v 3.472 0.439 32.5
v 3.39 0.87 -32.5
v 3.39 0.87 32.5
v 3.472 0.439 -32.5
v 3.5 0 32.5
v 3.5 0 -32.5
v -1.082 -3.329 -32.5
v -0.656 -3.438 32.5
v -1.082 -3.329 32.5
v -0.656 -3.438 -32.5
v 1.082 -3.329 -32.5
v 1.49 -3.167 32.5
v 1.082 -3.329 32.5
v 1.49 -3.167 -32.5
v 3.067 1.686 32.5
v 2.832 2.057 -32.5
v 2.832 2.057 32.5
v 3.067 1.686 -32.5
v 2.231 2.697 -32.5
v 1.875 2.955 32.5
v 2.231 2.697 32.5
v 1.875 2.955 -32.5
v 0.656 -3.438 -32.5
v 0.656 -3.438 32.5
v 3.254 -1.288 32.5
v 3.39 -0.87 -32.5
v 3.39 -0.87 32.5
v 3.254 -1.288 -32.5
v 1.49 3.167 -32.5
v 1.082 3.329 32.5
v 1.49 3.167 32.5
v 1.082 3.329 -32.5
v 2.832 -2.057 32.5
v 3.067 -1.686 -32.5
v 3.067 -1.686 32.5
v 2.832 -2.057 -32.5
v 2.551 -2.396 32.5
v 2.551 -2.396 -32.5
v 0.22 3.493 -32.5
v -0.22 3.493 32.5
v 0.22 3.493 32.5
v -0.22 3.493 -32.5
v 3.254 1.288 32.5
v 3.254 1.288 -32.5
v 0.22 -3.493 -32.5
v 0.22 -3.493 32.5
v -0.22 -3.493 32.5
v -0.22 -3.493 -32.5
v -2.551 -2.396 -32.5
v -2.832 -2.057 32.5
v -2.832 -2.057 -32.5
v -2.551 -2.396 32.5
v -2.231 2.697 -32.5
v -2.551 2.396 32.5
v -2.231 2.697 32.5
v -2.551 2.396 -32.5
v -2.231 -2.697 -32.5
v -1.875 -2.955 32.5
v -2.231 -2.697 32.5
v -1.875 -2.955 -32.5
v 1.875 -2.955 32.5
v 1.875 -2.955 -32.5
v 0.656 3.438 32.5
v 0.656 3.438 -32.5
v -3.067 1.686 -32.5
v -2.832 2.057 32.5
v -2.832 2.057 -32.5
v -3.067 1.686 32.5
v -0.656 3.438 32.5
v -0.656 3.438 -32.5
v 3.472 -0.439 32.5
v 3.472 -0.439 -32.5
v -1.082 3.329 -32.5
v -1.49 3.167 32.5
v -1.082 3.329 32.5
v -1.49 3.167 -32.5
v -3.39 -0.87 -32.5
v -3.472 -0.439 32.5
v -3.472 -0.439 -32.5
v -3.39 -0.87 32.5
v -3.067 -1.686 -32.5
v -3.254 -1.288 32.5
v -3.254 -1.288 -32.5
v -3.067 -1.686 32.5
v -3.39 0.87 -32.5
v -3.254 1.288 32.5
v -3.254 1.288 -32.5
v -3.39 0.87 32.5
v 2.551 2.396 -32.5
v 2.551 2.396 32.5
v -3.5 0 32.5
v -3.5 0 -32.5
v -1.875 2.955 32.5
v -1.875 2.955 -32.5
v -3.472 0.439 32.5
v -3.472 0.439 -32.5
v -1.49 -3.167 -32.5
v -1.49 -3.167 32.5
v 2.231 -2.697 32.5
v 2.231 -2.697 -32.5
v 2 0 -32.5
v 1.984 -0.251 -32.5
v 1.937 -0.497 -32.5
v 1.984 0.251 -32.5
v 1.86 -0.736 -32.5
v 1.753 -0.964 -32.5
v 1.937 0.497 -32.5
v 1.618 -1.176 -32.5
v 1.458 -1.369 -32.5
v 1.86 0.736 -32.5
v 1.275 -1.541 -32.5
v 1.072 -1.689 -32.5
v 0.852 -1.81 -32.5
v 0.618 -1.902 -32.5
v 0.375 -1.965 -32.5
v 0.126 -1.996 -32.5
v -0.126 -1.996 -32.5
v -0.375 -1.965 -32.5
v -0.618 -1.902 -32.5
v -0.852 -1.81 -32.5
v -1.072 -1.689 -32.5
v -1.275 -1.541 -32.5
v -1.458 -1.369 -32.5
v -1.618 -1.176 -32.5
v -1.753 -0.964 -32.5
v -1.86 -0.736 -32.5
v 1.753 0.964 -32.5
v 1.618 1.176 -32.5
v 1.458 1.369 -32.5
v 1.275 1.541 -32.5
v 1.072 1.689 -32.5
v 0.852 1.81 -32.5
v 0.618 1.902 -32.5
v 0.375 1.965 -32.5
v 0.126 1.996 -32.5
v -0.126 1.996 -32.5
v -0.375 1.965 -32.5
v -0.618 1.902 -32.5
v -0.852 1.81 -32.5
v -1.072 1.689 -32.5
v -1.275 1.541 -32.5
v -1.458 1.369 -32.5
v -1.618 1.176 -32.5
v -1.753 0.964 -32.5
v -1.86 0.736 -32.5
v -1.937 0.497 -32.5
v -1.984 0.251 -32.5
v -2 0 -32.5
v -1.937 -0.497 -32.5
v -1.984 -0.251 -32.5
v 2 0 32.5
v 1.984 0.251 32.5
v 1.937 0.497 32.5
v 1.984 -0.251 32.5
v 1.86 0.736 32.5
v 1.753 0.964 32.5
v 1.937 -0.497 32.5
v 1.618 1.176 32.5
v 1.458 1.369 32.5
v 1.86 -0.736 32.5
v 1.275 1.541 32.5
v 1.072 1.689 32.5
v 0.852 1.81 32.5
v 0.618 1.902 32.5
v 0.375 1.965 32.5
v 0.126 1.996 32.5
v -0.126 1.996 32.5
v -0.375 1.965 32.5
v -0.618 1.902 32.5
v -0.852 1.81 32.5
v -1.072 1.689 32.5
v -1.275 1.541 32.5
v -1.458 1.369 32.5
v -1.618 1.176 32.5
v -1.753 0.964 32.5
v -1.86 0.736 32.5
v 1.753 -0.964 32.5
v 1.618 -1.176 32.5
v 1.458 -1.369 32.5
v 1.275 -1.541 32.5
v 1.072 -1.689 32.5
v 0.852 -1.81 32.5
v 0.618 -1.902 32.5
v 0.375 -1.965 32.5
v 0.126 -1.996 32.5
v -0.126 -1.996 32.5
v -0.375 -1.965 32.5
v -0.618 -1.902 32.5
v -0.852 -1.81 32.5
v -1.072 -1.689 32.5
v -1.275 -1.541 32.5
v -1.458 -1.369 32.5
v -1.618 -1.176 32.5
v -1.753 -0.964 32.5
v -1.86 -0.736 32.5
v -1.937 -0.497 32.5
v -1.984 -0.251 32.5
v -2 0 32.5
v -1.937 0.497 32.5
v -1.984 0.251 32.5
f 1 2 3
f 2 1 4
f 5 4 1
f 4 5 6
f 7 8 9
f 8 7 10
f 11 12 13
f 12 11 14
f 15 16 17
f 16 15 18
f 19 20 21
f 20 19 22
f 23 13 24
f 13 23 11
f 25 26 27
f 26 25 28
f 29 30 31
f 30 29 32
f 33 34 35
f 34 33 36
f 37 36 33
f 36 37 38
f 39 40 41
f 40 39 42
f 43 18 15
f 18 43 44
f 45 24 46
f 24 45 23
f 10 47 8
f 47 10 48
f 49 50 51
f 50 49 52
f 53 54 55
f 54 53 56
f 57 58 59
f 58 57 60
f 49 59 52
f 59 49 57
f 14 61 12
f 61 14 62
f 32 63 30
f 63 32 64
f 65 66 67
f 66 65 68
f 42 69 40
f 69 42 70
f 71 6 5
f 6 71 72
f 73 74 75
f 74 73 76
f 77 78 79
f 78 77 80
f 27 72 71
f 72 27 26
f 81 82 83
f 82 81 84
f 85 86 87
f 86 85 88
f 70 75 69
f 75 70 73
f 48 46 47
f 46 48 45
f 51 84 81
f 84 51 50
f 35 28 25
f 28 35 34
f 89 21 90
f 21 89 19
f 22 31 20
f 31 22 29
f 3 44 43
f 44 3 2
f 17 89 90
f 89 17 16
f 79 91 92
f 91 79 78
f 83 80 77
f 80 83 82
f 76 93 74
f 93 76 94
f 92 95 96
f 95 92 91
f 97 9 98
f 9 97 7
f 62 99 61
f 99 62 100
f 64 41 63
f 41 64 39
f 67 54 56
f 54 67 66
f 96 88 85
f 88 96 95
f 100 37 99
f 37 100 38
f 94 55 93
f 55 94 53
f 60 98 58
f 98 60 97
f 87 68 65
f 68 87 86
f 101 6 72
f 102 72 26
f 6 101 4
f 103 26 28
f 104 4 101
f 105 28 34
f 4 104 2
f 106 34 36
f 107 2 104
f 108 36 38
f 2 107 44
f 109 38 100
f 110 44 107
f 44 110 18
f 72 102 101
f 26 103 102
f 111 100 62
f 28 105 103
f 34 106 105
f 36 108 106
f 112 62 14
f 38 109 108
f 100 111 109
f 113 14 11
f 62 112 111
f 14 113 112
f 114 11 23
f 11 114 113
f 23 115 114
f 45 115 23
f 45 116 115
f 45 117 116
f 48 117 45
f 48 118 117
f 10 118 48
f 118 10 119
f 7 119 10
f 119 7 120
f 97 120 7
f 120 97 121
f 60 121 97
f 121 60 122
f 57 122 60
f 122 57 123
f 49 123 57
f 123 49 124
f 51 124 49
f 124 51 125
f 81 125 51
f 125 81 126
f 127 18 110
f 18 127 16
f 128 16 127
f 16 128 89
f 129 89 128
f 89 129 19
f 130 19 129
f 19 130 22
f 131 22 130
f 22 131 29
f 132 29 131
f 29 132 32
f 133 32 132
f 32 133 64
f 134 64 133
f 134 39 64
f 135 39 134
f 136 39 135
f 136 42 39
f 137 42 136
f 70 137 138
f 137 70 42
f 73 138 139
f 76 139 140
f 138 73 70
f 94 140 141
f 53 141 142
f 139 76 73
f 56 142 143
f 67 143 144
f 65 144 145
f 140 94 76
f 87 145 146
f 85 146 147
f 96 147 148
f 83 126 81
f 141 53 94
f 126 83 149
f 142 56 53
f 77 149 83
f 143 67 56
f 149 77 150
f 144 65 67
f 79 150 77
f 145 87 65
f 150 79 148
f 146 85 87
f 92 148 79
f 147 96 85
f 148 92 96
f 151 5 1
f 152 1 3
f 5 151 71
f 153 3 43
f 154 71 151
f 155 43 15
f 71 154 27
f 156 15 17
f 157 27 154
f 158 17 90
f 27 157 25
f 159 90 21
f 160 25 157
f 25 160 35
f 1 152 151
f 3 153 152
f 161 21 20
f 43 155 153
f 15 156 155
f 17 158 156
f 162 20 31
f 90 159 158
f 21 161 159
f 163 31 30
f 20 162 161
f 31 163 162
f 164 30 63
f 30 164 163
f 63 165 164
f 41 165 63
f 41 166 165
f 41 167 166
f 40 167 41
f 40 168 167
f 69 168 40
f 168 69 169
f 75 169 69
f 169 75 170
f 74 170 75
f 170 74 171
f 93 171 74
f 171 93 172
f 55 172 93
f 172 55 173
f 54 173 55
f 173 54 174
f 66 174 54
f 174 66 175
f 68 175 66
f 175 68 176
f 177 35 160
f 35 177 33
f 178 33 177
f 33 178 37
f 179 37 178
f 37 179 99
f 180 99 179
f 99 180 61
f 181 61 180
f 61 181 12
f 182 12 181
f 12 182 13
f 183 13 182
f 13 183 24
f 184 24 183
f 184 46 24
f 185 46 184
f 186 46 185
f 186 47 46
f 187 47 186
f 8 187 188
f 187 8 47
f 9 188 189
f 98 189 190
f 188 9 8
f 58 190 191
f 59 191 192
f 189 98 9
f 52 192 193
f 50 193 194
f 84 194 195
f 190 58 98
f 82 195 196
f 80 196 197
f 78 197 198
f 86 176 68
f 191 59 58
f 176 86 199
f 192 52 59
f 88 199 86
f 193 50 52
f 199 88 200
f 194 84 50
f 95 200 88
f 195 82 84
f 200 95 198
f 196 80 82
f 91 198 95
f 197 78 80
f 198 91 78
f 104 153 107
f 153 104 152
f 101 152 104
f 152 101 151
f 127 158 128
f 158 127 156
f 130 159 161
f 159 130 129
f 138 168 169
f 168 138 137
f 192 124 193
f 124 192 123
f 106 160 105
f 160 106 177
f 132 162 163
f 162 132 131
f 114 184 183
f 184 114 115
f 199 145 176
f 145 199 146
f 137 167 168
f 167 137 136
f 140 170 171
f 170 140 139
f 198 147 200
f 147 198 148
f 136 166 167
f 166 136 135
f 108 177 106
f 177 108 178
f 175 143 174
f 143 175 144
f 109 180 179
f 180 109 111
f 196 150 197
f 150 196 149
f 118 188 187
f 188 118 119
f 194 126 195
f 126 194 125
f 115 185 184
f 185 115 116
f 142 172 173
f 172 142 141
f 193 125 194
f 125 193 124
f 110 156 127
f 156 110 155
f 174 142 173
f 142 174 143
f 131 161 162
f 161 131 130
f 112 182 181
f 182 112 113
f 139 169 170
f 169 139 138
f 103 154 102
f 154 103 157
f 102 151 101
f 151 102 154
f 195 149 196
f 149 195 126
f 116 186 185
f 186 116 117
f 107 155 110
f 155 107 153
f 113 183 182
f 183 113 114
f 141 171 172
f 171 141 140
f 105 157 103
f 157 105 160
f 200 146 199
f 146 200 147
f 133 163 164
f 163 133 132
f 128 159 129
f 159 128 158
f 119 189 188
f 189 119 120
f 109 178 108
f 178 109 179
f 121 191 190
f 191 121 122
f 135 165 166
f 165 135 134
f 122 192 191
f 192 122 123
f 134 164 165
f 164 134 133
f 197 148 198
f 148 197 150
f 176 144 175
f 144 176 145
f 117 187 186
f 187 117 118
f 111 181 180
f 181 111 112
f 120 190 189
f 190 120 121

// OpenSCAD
$fn = 50;


difference() {
	union() {
		translate(v = [0, 0, -32.5000000000]) {
			cylinder(h = 65, r = 3.5000000000);
		}
	}
	union() {
		translate(v = [0, 0, -100.0000000000]) {
			cylinder(h = 200, r = 2.0000000000);
		}
	}
}
